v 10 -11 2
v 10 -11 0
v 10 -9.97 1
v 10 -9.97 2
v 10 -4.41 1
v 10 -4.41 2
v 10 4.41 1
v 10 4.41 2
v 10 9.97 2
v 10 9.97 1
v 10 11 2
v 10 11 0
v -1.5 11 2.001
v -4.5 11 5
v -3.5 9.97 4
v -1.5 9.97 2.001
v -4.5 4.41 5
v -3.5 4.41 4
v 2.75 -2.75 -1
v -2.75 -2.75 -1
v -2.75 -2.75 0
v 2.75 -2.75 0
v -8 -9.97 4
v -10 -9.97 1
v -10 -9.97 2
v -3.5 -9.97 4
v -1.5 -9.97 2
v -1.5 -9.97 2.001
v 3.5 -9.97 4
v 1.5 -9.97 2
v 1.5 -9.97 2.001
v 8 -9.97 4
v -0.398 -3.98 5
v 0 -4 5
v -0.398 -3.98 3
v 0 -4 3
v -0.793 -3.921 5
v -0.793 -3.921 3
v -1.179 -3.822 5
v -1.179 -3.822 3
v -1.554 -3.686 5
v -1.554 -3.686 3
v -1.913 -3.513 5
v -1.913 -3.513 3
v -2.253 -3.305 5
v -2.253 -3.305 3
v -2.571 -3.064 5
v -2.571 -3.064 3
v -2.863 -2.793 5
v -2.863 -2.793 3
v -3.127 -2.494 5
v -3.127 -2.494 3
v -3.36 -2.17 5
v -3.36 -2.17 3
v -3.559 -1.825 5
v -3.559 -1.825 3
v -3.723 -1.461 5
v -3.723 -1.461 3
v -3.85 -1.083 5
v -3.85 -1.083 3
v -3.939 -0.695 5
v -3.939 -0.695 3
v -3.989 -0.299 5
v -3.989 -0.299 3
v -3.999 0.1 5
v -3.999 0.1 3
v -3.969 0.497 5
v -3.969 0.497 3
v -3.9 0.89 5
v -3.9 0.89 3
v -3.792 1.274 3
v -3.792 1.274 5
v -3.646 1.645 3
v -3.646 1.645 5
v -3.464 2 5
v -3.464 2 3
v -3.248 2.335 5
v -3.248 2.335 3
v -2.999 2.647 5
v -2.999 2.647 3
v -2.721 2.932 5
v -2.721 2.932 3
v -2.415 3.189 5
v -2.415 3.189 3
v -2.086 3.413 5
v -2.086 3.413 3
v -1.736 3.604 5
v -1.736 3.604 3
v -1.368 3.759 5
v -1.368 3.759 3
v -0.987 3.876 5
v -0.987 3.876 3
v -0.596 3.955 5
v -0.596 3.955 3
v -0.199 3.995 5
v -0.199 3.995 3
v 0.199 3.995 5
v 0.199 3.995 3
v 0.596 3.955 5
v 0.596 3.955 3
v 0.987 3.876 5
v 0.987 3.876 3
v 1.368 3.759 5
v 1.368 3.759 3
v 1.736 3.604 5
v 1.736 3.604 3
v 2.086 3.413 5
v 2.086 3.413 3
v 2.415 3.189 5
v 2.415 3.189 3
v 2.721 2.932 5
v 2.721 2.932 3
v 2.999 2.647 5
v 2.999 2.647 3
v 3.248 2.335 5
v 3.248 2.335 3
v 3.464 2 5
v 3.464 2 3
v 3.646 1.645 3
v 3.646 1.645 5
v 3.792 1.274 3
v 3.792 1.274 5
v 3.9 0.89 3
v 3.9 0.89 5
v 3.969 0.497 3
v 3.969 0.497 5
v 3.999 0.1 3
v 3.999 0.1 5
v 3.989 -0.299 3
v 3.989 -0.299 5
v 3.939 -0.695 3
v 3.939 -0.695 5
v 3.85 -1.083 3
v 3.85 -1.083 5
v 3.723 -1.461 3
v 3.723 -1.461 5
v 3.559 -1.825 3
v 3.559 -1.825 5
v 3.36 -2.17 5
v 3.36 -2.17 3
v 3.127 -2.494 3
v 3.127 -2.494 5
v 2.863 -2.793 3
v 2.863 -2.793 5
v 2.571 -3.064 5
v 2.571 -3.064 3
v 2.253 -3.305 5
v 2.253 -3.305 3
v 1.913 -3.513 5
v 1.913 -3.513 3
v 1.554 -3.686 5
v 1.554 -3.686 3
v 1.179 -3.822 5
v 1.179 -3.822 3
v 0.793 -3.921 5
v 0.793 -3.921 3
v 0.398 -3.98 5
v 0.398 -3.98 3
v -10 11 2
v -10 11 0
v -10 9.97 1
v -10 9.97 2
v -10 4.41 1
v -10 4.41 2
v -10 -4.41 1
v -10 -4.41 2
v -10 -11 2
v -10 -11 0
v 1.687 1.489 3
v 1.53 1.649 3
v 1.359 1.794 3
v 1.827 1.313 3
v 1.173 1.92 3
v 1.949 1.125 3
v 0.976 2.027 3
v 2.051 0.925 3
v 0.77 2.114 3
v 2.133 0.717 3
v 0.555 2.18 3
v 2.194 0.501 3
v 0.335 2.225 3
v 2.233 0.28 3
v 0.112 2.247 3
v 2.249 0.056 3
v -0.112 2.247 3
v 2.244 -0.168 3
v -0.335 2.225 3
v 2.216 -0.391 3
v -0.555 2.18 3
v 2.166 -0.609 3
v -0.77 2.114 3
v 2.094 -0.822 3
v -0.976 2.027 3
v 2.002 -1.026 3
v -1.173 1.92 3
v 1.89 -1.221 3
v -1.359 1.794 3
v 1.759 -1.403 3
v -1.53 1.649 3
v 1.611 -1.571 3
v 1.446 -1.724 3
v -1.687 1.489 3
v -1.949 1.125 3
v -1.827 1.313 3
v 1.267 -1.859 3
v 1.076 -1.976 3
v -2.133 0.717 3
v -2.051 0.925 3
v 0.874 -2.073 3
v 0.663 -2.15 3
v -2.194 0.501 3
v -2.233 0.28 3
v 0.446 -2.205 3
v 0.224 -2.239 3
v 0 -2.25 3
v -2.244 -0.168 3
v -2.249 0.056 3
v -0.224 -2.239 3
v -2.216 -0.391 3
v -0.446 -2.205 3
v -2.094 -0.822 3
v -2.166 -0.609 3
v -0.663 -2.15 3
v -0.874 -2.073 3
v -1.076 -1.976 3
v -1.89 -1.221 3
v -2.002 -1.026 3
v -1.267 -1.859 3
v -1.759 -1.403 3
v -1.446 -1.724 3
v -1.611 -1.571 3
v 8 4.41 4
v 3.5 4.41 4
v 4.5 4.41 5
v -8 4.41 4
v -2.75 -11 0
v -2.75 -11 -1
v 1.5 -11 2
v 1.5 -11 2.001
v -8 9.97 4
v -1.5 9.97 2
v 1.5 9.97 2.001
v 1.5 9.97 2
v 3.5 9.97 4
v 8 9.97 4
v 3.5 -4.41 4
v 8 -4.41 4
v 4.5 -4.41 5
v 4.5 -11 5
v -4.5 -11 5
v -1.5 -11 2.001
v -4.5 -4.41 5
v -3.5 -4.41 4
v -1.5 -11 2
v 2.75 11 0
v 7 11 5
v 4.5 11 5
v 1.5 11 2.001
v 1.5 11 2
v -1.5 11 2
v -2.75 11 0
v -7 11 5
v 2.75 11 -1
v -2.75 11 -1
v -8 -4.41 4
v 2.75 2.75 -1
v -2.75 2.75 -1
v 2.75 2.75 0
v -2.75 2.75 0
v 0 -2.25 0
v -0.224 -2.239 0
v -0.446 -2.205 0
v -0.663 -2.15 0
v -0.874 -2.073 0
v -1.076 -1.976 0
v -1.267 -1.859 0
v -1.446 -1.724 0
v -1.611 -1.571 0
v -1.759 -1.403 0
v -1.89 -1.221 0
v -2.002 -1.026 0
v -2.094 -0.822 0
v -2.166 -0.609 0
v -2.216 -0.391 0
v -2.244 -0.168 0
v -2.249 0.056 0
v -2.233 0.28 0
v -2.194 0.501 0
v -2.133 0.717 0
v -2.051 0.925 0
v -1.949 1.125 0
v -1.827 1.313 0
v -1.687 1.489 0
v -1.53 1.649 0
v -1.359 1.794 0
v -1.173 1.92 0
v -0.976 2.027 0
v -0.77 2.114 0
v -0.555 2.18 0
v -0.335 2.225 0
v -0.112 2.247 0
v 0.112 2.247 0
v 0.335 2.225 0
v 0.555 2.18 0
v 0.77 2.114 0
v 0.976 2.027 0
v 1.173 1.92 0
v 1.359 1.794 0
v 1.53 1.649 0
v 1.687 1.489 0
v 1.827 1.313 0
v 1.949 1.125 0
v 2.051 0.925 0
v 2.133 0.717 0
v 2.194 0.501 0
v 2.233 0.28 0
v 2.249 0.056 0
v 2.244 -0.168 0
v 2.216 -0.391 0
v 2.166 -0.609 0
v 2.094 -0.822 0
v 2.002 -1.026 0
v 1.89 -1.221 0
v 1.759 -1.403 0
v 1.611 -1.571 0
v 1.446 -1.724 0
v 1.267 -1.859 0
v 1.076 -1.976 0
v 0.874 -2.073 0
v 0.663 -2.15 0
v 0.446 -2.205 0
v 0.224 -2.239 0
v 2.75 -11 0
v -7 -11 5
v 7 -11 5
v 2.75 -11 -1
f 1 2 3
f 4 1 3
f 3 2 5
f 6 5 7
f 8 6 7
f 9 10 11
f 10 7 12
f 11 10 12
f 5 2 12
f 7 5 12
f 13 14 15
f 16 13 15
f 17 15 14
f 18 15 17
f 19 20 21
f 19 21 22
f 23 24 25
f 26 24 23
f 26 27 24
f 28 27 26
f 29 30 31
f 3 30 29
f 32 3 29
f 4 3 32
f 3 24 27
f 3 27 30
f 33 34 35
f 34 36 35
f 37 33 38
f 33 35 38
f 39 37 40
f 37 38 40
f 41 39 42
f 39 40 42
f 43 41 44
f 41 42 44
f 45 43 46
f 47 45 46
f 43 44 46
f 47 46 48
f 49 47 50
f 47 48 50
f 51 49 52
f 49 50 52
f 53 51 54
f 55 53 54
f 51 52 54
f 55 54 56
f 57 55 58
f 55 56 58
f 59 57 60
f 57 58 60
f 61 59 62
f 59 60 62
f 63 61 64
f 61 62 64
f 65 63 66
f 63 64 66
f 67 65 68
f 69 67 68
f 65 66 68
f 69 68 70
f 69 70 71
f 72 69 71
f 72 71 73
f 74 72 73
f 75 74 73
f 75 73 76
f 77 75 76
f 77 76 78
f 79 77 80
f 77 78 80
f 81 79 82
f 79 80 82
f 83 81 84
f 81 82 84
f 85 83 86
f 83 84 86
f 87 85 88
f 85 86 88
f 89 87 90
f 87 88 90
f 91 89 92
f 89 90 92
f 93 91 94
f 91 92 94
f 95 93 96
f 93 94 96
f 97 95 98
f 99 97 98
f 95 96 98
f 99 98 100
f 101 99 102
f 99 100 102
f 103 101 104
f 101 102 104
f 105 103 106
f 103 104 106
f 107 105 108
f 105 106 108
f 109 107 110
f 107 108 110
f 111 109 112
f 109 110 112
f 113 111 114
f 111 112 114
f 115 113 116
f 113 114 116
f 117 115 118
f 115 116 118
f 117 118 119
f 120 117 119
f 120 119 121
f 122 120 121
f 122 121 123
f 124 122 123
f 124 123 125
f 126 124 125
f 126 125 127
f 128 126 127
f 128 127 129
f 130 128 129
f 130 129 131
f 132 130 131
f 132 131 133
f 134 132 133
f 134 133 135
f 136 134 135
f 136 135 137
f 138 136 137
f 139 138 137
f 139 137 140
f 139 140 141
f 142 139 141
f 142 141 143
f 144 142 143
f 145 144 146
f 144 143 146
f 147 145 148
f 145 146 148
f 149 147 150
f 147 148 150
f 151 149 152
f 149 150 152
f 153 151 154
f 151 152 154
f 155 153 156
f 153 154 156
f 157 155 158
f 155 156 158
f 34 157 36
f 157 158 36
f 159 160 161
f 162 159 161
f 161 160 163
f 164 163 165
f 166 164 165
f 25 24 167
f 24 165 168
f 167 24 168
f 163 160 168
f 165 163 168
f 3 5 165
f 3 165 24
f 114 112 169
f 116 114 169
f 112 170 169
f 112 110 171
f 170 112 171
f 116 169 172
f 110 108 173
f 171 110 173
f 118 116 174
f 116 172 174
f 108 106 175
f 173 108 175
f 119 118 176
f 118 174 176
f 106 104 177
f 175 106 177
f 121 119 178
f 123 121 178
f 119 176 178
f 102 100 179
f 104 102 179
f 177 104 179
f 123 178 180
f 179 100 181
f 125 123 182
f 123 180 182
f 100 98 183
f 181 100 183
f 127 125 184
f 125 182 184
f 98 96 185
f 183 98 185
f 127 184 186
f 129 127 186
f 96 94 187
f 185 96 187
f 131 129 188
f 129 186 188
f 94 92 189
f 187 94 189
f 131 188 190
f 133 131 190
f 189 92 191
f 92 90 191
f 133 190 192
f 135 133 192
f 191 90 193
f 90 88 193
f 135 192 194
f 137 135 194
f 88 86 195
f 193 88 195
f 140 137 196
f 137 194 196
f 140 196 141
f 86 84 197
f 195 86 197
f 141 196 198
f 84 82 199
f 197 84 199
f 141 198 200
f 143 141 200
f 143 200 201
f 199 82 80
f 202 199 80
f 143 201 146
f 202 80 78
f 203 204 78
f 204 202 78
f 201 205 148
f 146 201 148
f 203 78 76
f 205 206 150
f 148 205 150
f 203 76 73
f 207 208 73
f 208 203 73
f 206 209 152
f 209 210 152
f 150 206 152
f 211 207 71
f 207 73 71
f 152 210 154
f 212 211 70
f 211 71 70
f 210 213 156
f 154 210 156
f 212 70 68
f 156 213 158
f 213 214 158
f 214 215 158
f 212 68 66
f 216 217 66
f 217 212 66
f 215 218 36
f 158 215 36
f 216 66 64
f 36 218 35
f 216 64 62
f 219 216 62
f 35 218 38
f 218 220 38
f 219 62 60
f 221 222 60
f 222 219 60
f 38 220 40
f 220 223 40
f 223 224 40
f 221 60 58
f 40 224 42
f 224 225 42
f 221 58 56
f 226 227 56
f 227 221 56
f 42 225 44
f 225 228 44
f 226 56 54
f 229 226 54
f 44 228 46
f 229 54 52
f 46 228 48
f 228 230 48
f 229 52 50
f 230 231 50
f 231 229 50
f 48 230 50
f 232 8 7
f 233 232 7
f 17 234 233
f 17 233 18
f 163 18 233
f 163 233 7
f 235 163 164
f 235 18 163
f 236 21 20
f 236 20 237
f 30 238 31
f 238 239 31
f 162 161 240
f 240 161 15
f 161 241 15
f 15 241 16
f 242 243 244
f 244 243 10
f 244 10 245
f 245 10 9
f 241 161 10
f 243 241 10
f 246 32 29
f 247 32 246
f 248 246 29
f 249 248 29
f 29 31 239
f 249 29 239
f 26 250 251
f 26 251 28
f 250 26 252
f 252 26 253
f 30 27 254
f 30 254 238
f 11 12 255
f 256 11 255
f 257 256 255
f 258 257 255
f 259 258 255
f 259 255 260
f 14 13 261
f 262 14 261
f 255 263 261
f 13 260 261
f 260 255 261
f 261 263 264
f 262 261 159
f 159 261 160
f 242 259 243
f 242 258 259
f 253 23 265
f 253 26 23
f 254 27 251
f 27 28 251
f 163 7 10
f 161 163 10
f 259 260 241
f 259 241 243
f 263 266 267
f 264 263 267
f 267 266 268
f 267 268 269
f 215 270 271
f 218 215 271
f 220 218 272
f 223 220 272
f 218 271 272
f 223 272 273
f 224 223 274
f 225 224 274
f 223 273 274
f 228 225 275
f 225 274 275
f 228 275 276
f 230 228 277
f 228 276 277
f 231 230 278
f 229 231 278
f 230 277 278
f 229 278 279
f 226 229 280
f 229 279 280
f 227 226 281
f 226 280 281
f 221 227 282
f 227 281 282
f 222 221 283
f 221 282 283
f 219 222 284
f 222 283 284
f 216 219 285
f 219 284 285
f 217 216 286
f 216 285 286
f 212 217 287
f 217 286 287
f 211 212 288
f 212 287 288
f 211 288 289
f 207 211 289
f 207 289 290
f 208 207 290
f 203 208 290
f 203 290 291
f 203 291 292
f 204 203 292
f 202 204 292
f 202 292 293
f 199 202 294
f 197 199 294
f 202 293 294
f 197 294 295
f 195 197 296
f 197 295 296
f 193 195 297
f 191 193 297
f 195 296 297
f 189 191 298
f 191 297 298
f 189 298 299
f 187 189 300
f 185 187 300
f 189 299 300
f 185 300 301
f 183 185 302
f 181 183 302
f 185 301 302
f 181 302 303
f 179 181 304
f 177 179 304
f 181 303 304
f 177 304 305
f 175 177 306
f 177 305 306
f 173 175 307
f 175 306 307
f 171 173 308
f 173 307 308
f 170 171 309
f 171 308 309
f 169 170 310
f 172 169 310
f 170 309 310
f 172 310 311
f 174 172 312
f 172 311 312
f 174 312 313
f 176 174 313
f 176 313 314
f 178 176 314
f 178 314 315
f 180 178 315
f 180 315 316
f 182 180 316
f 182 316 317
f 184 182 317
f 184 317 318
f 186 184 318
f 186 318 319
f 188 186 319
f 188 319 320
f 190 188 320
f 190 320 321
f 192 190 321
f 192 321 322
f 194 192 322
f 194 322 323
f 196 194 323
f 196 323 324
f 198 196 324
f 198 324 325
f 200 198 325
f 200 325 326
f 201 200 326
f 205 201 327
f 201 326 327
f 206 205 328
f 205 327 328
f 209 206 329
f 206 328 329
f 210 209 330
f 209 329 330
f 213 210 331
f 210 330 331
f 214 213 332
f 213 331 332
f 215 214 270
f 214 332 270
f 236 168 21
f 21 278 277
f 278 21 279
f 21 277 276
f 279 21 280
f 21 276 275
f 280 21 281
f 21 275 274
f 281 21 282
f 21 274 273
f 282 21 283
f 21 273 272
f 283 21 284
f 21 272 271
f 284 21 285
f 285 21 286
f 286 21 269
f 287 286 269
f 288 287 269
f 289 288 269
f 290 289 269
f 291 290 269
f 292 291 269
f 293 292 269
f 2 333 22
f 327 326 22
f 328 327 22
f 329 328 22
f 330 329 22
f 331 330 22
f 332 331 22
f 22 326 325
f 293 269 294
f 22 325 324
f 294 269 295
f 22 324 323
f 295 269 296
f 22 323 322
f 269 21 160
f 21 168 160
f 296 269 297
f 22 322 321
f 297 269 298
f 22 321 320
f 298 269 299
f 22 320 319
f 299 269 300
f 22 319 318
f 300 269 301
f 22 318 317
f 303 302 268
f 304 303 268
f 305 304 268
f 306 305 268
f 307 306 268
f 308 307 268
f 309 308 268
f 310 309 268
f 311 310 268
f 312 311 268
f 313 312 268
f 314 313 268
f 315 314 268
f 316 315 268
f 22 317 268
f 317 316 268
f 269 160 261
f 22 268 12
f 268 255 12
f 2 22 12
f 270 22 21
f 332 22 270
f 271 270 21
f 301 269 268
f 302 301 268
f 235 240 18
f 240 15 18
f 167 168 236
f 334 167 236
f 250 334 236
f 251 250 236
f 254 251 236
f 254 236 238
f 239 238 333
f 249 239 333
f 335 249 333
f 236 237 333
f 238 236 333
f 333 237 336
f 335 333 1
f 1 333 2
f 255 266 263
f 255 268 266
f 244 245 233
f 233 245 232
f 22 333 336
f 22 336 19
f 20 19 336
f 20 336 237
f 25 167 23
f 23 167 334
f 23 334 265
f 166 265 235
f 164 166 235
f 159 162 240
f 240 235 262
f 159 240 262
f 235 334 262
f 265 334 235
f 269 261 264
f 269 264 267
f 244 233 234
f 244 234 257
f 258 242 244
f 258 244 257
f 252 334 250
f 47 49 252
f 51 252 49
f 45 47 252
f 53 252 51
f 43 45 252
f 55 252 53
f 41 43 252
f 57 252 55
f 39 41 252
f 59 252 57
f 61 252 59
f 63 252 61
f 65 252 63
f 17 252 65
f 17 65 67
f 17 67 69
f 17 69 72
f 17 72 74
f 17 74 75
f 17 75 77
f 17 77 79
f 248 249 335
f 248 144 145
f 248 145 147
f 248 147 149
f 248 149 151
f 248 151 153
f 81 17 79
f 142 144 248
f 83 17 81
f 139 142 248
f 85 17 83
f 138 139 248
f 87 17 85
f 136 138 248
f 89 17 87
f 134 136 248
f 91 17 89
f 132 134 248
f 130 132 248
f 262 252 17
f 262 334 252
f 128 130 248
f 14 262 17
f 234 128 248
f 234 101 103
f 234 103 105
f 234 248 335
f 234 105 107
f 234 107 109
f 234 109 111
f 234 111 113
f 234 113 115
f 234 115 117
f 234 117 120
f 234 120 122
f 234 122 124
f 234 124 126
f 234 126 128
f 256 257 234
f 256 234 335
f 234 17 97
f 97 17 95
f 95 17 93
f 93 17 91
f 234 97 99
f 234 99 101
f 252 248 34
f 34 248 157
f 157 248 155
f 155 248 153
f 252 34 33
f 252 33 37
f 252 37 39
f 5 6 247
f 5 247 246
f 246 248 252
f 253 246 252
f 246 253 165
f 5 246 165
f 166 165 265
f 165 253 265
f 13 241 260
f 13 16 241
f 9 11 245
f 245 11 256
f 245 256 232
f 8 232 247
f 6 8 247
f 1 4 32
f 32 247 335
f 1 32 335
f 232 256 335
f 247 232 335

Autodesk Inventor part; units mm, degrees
ref_plane "YZ Plane" through (0, 0, 0) normal (1, 0, 0) x (0, 1, 0)
ref_plane "XZ Plane" through (0, 0, 0) normal (0, 1, 0) x (-1, 0, 0)
ref_plane "XY Plane" through (0, 0, 0) normal (0, 0, 1) x (1, 0, 0)
sketch "Sketch1" plane through (0, 0, 0) normal (0, 0, 1) x (1, 0, 0)
  line L0 (10, 11) -> (-10, 11)
  line L1 (-10, 11) -> (-10, -11)
  line L2 (-10, -11) -> (10, -11)
  line L3 (10, -11) -> (10, 11)
  line L4 (10, 11) -> (-10, -11) construction
  line L5 (-10, 11) -> (10, -11) construction
  line L6 (0, -12.7143) -> (0, 12.7143) construction
  line L7 (12, 0) -> (-13.2325, 0) construction
  point P0 (0, 0)
  dimension "d0" = 20
  dimension "d1" = 22
extrude "Extrusion1" add sketch "Sketch1" along normal blind 5
chamfer "Chamfer7" distance 3 angle 45 2 edges at (10, 0, 5) (-10, 0, 5)
sketch "Sketch2" plane through (0, 0, 0) normal (0, 0, -1) x (-1, 0, 0)
  line L0 (2, 1.1547) -> (2, -1.1547) projected
  line L1 (2, -1.1547) -> (0, -2.3094) projected
  line L2 (0, -2.3094) -> (-2, -1.1547) projected
  line L3 (-2, -1.1547) -> (-2, 1.1547) projected
  line L4 (-2, 1.1547) -> (0, 2.3094) projected
  line L5 (0, 2.3094) -> (2, 1.1547) projected
  line L6 (10, -11) -> (-10, -11) projected
  line L7 (-2.75, 11) -> (2.75, 11)
  line L8 (2.75, 11) -> (2.75, -11)
  line L9 (2.75, -11) -> (-2.75, -11)
  line L10 (-2.75, -11) -> (-2.75, 11)
  line L11 (-2.75, 11) -> (2.75, -11) construction
  line L12 (2.75, 11) -> (-2.75, -11) construction
  point P0 (0, 0)
  dimension "d5" = 5.5
extrude "Extrusion2" add sketch "Sketch2" along normal blind 1
sketch "Sketch3" plane through (0, 0, -1) normal (0, 0, -1) x (-1, 0, 0)
  line L0 (2, -1.1547) -> (0, -2.3094) projected
  line L1 (0, -2.3094) -> (-2, -1.1547) projected
  line L2 (-2, -1.1547) -> (-2, 1.1547) projected
  line L3 (-2, 1.1547) -> (0, 2.3094) projected
  line L4 (0, 2.3094) -> (2, 1.1547) projected
  line L5 (2, 1.1547) -> (2, -1.1547) projected
  line L6 (-2.75, 2.75) -> (2.75, 2.75)
  line L7 (2.75, 2.75) -> (2.75, -2.75)
  line L8 (2.75, -2.75) -> (-2.75, -2.75)
  line L9 (-2.75, -2.75) -> (-2.75, 2.75)
  line L10 (-2.75, 2.75) -> (2.75, -2.75) construction
  line L11 (2.75, 2.75) -> (-2.75, -2.75) construction
  point P0 (0, 0)
  dimension "d8" = 5.5
  dimension "d9" = 5.5
extrude "Extrusion3" cut sketch "Sketch3" against normal up to surface (1 mm away) from surface at 0
sketch "Sketch8" plane through (0, 0, 5) normal (0, 0, 1) x (1, 0, 0)
  line L0 (-7, -11) -> (7, -11) projected
  line L1 (7, 11) -> (-7, 11) projected
  line L2 (-1.5, -11) -> (1.5, -11)
  line L3 (1.5, -11) -> (1.5, -4.4105)
  line L4 (1.5, -4.4105) -> (-1.5, -4.4105)
  line L5 (-1.5, -4.4105) -> (-1.5, -11)
  line L6 (-1.5, 11) -> (1.5, 11)
  line L7 (1.5, 11) -> (1.5, 4.4105)
  line L8 (1.5, 4.4105) -> (-1.5, 4.4105)
  line L9 (-1.5, 4.4105) -> (-1.5, 11)
  line L10 (-1.5, -11) -> (-1.5, 11) construction
  line L11 (1.5, -11) -> (1.5, 11) construction
  line L12 (1.5, 4.4105) -> (0, 0) construction
  line L13 (0, 0) -> (-1.5, 4.4105) construction
  line L14 (1.5, -4.4105) -> (0, 0) construction
  line L15 (-1.5, -4.4105) -> (0, 0) construction
  dimension "d83" = 3
extrude "Extrusion7" cut sketch "Sketch8" against normal blind 3
chamfer "Chamfer8" distance 3 angle 45 4 edges at (-1.5, 7.7052, 5) (-1.5, -7.7052, 5) (1.5, -7.7052, 5) (1.5, 7.7052, 5)
sketch "Sketch9" plane through (10, -11, 0) normal (1, 0, 0) x (0, 0, -1)
  line L0 (-2, 0) -> (-2, 22) construction
  line L1 (-1, -1) -> (-1, 22.6316) construction
  line L2 (-1, 1.0298) -> (-4, 1.0298)
  line L3 (-4, 1.0298) -> (-4, 6.5895)
  line L4 (-4, 6.5895) -> (-1, 6.5895)
  line L5 (-1, 6.5895) -> (-1, 1.0298)
  line L6 (-1, 20.9702) -> (-4, 20.9702)
  line L7 (-4, 20.9702) -> (-4, 15.4105)
  line L8 (-4, 15.4105) -> (-1, 15.4105)
  line L9 (-1, 15.4105) -> (-1, 20.9702)
  line L10 (-5, 6.5895) -> (-2, 6.5895) construction
  line L11 (-2, 15.4105) -> (-5, 15.4105) construction
  point P0 (0, 11)
  dimension "d85" = 1
extrude "Extrusion8" cut sketch "Sketch9" against normal through all
sketch "Sketch10" plane through (0, 0, 5) normal (0, 0, 1) x (1, 0, 0)
  point P0 (0, 0)
  point P1 (0, 0)
hole "Hole2" at (0, 0, 5) direction (0, 0, -1) diameter 4.5 end through all counterbore diameter 8 counterbore depth 2 clearance for "Socket Head Cap Screw" size "M4" standard "Ansi Metric M Profile"
properties part number "harness clip"
